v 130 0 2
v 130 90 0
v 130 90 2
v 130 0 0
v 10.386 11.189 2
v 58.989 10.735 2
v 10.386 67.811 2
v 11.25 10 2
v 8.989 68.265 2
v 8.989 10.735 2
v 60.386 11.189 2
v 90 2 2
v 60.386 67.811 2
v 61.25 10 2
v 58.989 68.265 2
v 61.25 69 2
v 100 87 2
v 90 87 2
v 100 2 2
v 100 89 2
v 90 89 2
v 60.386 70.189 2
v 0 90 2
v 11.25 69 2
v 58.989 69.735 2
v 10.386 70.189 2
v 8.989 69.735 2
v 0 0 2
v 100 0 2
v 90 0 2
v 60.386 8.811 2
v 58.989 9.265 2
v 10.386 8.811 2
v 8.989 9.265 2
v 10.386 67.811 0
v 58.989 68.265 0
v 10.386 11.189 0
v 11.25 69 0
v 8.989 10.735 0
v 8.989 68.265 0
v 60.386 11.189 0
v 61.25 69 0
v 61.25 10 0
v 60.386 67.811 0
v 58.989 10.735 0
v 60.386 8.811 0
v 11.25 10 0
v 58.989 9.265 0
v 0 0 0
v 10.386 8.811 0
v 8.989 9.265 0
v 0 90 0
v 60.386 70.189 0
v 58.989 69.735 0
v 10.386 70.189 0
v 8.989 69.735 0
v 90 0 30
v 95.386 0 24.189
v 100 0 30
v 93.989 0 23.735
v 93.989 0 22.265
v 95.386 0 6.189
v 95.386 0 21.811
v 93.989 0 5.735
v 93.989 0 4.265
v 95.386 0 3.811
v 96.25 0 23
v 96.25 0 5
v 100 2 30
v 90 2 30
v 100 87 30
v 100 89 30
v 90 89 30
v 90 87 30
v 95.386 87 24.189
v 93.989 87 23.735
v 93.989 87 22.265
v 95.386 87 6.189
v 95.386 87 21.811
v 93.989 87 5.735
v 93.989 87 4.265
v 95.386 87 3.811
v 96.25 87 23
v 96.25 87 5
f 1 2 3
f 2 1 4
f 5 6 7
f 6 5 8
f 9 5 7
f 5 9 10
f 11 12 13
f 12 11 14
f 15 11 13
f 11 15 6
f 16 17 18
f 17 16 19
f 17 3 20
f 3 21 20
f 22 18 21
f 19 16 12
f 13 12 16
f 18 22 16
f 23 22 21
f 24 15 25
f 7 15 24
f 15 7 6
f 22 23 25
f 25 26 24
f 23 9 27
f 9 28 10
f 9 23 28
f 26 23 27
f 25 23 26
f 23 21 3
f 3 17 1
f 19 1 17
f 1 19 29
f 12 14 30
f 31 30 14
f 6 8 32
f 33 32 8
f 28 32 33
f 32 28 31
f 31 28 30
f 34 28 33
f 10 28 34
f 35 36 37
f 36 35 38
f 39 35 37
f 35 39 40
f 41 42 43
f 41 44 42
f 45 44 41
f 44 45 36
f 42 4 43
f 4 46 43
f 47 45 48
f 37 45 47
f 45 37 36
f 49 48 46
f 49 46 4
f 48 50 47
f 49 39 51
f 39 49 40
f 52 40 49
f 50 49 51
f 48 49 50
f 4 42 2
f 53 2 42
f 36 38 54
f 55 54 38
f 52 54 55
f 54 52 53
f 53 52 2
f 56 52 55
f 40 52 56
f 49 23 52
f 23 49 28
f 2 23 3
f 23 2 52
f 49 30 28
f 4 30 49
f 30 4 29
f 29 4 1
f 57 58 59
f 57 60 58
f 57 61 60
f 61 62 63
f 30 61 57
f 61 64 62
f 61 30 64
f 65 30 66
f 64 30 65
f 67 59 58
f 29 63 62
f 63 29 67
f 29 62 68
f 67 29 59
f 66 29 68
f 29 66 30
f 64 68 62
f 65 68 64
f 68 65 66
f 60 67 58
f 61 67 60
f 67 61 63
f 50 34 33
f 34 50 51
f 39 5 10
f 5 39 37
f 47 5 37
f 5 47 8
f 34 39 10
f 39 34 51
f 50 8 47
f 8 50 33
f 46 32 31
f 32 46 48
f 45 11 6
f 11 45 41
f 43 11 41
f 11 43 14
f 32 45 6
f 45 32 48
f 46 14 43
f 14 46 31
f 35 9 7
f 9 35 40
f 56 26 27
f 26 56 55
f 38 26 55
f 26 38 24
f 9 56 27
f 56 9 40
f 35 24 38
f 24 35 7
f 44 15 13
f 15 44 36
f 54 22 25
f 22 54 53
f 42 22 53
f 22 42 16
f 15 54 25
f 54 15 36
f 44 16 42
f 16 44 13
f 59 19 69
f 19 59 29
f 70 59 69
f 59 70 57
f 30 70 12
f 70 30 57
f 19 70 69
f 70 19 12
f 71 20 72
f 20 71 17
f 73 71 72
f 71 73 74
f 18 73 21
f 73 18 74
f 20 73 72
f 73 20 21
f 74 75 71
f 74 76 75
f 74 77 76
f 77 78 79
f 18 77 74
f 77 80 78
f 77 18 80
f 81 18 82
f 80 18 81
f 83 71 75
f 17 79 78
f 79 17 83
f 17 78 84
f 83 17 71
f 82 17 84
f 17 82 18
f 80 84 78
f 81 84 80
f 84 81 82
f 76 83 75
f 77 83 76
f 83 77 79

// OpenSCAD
length=130;
width=90;
side_width=30;
thickness=2;

difference(){
    cube([length,width,thickness]);
    translate([10,10,0]){
    cylinder(h=2,d=2.5);
    }
    translate([60,10,0]){
        cylinder(h=2,d=2.5);
    }
    translate([10,69,0]){
        cylinder(h=2,d=2.5);
    }
    translate([60,69,0]){
        cylinder(h=2,d=2.5);
    }
    
}

difference(){
    translate([90,0,0]){
        cube([10,2,30]);
    }
    translate([95,0,5]){
    rotate([90,0,0]){
        cylinder(h=3,d=2.5);
    }
}   
    translate([95,0,23]){
    rotate([90,0,0]){
        cylinder(h=3,d=2.5);
    }
}
}

difference(){
    translate([90,87,0]){
        cube([10,2,30]);
    }
    translate([95,87,5]){
    rotate([90,0,0]){
        cylinder(h=3,d=2.5);
    }
}
    translate([95,87,23]){
    rotate([90,0,0]){
        cylinder(h=3,d=2.5);
    }
}
}
